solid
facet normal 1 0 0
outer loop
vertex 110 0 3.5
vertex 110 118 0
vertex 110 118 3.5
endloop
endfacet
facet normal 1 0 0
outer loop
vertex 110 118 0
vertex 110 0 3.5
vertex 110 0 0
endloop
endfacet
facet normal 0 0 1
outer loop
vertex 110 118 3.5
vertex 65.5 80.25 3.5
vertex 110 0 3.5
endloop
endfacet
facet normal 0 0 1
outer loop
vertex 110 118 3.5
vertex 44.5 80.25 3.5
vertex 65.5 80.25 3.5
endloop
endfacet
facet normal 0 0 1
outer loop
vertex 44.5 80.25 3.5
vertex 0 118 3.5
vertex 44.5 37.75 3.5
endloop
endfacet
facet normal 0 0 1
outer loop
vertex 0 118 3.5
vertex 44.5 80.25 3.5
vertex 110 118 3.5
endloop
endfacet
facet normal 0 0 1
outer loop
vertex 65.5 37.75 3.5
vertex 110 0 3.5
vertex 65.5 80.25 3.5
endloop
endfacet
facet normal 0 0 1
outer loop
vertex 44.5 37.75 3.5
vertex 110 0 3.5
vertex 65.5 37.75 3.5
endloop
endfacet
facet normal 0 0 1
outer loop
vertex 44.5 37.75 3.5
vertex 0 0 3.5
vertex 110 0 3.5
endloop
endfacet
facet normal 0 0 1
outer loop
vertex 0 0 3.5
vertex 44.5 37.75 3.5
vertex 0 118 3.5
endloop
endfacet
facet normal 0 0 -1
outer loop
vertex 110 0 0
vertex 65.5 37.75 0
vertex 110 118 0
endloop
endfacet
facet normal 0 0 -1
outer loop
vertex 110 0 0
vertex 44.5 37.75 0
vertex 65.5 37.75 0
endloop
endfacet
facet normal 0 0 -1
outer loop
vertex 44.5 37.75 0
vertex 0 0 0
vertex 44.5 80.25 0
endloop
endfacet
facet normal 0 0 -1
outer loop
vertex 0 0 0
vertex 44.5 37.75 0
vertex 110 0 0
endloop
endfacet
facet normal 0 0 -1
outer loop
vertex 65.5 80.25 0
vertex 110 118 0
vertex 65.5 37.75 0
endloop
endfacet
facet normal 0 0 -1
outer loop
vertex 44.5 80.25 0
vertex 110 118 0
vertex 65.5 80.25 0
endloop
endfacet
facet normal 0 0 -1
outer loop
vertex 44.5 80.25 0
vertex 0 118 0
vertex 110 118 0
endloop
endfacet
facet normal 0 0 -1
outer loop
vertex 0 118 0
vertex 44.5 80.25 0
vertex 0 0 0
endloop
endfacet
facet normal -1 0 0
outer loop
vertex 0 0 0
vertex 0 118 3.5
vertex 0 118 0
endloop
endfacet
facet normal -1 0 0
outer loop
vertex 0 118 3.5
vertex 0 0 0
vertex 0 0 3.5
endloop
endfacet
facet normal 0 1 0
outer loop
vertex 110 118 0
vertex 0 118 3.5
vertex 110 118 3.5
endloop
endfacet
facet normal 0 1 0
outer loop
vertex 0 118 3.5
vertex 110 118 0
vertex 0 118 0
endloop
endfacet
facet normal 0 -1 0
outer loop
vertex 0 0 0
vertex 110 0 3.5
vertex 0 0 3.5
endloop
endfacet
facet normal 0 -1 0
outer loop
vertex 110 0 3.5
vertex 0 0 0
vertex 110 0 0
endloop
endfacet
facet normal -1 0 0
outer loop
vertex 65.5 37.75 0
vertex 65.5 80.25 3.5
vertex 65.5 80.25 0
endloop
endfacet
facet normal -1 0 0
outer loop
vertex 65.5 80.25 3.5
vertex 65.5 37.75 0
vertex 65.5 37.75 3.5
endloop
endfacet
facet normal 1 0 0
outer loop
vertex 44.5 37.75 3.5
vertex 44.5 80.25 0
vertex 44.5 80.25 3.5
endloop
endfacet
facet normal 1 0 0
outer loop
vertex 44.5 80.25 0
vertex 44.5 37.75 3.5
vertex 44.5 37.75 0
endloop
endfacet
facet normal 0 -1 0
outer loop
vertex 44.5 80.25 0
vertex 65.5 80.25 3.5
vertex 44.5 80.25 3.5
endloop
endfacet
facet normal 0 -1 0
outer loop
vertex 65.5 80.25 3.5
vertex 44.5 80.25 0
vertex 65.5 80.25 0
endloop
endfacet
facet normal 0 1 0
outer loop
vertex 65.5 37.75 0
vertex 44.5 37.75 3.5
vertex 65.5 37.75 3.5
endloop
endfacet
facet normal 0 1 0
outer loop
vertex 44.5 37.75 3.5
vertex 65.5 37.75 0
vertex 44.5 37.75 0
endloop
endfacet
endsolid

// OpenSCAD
difference(){
cube([110,118,3.5]);
translate([44.5,37.75,0])cube([21,42.5,3.5]);
}
